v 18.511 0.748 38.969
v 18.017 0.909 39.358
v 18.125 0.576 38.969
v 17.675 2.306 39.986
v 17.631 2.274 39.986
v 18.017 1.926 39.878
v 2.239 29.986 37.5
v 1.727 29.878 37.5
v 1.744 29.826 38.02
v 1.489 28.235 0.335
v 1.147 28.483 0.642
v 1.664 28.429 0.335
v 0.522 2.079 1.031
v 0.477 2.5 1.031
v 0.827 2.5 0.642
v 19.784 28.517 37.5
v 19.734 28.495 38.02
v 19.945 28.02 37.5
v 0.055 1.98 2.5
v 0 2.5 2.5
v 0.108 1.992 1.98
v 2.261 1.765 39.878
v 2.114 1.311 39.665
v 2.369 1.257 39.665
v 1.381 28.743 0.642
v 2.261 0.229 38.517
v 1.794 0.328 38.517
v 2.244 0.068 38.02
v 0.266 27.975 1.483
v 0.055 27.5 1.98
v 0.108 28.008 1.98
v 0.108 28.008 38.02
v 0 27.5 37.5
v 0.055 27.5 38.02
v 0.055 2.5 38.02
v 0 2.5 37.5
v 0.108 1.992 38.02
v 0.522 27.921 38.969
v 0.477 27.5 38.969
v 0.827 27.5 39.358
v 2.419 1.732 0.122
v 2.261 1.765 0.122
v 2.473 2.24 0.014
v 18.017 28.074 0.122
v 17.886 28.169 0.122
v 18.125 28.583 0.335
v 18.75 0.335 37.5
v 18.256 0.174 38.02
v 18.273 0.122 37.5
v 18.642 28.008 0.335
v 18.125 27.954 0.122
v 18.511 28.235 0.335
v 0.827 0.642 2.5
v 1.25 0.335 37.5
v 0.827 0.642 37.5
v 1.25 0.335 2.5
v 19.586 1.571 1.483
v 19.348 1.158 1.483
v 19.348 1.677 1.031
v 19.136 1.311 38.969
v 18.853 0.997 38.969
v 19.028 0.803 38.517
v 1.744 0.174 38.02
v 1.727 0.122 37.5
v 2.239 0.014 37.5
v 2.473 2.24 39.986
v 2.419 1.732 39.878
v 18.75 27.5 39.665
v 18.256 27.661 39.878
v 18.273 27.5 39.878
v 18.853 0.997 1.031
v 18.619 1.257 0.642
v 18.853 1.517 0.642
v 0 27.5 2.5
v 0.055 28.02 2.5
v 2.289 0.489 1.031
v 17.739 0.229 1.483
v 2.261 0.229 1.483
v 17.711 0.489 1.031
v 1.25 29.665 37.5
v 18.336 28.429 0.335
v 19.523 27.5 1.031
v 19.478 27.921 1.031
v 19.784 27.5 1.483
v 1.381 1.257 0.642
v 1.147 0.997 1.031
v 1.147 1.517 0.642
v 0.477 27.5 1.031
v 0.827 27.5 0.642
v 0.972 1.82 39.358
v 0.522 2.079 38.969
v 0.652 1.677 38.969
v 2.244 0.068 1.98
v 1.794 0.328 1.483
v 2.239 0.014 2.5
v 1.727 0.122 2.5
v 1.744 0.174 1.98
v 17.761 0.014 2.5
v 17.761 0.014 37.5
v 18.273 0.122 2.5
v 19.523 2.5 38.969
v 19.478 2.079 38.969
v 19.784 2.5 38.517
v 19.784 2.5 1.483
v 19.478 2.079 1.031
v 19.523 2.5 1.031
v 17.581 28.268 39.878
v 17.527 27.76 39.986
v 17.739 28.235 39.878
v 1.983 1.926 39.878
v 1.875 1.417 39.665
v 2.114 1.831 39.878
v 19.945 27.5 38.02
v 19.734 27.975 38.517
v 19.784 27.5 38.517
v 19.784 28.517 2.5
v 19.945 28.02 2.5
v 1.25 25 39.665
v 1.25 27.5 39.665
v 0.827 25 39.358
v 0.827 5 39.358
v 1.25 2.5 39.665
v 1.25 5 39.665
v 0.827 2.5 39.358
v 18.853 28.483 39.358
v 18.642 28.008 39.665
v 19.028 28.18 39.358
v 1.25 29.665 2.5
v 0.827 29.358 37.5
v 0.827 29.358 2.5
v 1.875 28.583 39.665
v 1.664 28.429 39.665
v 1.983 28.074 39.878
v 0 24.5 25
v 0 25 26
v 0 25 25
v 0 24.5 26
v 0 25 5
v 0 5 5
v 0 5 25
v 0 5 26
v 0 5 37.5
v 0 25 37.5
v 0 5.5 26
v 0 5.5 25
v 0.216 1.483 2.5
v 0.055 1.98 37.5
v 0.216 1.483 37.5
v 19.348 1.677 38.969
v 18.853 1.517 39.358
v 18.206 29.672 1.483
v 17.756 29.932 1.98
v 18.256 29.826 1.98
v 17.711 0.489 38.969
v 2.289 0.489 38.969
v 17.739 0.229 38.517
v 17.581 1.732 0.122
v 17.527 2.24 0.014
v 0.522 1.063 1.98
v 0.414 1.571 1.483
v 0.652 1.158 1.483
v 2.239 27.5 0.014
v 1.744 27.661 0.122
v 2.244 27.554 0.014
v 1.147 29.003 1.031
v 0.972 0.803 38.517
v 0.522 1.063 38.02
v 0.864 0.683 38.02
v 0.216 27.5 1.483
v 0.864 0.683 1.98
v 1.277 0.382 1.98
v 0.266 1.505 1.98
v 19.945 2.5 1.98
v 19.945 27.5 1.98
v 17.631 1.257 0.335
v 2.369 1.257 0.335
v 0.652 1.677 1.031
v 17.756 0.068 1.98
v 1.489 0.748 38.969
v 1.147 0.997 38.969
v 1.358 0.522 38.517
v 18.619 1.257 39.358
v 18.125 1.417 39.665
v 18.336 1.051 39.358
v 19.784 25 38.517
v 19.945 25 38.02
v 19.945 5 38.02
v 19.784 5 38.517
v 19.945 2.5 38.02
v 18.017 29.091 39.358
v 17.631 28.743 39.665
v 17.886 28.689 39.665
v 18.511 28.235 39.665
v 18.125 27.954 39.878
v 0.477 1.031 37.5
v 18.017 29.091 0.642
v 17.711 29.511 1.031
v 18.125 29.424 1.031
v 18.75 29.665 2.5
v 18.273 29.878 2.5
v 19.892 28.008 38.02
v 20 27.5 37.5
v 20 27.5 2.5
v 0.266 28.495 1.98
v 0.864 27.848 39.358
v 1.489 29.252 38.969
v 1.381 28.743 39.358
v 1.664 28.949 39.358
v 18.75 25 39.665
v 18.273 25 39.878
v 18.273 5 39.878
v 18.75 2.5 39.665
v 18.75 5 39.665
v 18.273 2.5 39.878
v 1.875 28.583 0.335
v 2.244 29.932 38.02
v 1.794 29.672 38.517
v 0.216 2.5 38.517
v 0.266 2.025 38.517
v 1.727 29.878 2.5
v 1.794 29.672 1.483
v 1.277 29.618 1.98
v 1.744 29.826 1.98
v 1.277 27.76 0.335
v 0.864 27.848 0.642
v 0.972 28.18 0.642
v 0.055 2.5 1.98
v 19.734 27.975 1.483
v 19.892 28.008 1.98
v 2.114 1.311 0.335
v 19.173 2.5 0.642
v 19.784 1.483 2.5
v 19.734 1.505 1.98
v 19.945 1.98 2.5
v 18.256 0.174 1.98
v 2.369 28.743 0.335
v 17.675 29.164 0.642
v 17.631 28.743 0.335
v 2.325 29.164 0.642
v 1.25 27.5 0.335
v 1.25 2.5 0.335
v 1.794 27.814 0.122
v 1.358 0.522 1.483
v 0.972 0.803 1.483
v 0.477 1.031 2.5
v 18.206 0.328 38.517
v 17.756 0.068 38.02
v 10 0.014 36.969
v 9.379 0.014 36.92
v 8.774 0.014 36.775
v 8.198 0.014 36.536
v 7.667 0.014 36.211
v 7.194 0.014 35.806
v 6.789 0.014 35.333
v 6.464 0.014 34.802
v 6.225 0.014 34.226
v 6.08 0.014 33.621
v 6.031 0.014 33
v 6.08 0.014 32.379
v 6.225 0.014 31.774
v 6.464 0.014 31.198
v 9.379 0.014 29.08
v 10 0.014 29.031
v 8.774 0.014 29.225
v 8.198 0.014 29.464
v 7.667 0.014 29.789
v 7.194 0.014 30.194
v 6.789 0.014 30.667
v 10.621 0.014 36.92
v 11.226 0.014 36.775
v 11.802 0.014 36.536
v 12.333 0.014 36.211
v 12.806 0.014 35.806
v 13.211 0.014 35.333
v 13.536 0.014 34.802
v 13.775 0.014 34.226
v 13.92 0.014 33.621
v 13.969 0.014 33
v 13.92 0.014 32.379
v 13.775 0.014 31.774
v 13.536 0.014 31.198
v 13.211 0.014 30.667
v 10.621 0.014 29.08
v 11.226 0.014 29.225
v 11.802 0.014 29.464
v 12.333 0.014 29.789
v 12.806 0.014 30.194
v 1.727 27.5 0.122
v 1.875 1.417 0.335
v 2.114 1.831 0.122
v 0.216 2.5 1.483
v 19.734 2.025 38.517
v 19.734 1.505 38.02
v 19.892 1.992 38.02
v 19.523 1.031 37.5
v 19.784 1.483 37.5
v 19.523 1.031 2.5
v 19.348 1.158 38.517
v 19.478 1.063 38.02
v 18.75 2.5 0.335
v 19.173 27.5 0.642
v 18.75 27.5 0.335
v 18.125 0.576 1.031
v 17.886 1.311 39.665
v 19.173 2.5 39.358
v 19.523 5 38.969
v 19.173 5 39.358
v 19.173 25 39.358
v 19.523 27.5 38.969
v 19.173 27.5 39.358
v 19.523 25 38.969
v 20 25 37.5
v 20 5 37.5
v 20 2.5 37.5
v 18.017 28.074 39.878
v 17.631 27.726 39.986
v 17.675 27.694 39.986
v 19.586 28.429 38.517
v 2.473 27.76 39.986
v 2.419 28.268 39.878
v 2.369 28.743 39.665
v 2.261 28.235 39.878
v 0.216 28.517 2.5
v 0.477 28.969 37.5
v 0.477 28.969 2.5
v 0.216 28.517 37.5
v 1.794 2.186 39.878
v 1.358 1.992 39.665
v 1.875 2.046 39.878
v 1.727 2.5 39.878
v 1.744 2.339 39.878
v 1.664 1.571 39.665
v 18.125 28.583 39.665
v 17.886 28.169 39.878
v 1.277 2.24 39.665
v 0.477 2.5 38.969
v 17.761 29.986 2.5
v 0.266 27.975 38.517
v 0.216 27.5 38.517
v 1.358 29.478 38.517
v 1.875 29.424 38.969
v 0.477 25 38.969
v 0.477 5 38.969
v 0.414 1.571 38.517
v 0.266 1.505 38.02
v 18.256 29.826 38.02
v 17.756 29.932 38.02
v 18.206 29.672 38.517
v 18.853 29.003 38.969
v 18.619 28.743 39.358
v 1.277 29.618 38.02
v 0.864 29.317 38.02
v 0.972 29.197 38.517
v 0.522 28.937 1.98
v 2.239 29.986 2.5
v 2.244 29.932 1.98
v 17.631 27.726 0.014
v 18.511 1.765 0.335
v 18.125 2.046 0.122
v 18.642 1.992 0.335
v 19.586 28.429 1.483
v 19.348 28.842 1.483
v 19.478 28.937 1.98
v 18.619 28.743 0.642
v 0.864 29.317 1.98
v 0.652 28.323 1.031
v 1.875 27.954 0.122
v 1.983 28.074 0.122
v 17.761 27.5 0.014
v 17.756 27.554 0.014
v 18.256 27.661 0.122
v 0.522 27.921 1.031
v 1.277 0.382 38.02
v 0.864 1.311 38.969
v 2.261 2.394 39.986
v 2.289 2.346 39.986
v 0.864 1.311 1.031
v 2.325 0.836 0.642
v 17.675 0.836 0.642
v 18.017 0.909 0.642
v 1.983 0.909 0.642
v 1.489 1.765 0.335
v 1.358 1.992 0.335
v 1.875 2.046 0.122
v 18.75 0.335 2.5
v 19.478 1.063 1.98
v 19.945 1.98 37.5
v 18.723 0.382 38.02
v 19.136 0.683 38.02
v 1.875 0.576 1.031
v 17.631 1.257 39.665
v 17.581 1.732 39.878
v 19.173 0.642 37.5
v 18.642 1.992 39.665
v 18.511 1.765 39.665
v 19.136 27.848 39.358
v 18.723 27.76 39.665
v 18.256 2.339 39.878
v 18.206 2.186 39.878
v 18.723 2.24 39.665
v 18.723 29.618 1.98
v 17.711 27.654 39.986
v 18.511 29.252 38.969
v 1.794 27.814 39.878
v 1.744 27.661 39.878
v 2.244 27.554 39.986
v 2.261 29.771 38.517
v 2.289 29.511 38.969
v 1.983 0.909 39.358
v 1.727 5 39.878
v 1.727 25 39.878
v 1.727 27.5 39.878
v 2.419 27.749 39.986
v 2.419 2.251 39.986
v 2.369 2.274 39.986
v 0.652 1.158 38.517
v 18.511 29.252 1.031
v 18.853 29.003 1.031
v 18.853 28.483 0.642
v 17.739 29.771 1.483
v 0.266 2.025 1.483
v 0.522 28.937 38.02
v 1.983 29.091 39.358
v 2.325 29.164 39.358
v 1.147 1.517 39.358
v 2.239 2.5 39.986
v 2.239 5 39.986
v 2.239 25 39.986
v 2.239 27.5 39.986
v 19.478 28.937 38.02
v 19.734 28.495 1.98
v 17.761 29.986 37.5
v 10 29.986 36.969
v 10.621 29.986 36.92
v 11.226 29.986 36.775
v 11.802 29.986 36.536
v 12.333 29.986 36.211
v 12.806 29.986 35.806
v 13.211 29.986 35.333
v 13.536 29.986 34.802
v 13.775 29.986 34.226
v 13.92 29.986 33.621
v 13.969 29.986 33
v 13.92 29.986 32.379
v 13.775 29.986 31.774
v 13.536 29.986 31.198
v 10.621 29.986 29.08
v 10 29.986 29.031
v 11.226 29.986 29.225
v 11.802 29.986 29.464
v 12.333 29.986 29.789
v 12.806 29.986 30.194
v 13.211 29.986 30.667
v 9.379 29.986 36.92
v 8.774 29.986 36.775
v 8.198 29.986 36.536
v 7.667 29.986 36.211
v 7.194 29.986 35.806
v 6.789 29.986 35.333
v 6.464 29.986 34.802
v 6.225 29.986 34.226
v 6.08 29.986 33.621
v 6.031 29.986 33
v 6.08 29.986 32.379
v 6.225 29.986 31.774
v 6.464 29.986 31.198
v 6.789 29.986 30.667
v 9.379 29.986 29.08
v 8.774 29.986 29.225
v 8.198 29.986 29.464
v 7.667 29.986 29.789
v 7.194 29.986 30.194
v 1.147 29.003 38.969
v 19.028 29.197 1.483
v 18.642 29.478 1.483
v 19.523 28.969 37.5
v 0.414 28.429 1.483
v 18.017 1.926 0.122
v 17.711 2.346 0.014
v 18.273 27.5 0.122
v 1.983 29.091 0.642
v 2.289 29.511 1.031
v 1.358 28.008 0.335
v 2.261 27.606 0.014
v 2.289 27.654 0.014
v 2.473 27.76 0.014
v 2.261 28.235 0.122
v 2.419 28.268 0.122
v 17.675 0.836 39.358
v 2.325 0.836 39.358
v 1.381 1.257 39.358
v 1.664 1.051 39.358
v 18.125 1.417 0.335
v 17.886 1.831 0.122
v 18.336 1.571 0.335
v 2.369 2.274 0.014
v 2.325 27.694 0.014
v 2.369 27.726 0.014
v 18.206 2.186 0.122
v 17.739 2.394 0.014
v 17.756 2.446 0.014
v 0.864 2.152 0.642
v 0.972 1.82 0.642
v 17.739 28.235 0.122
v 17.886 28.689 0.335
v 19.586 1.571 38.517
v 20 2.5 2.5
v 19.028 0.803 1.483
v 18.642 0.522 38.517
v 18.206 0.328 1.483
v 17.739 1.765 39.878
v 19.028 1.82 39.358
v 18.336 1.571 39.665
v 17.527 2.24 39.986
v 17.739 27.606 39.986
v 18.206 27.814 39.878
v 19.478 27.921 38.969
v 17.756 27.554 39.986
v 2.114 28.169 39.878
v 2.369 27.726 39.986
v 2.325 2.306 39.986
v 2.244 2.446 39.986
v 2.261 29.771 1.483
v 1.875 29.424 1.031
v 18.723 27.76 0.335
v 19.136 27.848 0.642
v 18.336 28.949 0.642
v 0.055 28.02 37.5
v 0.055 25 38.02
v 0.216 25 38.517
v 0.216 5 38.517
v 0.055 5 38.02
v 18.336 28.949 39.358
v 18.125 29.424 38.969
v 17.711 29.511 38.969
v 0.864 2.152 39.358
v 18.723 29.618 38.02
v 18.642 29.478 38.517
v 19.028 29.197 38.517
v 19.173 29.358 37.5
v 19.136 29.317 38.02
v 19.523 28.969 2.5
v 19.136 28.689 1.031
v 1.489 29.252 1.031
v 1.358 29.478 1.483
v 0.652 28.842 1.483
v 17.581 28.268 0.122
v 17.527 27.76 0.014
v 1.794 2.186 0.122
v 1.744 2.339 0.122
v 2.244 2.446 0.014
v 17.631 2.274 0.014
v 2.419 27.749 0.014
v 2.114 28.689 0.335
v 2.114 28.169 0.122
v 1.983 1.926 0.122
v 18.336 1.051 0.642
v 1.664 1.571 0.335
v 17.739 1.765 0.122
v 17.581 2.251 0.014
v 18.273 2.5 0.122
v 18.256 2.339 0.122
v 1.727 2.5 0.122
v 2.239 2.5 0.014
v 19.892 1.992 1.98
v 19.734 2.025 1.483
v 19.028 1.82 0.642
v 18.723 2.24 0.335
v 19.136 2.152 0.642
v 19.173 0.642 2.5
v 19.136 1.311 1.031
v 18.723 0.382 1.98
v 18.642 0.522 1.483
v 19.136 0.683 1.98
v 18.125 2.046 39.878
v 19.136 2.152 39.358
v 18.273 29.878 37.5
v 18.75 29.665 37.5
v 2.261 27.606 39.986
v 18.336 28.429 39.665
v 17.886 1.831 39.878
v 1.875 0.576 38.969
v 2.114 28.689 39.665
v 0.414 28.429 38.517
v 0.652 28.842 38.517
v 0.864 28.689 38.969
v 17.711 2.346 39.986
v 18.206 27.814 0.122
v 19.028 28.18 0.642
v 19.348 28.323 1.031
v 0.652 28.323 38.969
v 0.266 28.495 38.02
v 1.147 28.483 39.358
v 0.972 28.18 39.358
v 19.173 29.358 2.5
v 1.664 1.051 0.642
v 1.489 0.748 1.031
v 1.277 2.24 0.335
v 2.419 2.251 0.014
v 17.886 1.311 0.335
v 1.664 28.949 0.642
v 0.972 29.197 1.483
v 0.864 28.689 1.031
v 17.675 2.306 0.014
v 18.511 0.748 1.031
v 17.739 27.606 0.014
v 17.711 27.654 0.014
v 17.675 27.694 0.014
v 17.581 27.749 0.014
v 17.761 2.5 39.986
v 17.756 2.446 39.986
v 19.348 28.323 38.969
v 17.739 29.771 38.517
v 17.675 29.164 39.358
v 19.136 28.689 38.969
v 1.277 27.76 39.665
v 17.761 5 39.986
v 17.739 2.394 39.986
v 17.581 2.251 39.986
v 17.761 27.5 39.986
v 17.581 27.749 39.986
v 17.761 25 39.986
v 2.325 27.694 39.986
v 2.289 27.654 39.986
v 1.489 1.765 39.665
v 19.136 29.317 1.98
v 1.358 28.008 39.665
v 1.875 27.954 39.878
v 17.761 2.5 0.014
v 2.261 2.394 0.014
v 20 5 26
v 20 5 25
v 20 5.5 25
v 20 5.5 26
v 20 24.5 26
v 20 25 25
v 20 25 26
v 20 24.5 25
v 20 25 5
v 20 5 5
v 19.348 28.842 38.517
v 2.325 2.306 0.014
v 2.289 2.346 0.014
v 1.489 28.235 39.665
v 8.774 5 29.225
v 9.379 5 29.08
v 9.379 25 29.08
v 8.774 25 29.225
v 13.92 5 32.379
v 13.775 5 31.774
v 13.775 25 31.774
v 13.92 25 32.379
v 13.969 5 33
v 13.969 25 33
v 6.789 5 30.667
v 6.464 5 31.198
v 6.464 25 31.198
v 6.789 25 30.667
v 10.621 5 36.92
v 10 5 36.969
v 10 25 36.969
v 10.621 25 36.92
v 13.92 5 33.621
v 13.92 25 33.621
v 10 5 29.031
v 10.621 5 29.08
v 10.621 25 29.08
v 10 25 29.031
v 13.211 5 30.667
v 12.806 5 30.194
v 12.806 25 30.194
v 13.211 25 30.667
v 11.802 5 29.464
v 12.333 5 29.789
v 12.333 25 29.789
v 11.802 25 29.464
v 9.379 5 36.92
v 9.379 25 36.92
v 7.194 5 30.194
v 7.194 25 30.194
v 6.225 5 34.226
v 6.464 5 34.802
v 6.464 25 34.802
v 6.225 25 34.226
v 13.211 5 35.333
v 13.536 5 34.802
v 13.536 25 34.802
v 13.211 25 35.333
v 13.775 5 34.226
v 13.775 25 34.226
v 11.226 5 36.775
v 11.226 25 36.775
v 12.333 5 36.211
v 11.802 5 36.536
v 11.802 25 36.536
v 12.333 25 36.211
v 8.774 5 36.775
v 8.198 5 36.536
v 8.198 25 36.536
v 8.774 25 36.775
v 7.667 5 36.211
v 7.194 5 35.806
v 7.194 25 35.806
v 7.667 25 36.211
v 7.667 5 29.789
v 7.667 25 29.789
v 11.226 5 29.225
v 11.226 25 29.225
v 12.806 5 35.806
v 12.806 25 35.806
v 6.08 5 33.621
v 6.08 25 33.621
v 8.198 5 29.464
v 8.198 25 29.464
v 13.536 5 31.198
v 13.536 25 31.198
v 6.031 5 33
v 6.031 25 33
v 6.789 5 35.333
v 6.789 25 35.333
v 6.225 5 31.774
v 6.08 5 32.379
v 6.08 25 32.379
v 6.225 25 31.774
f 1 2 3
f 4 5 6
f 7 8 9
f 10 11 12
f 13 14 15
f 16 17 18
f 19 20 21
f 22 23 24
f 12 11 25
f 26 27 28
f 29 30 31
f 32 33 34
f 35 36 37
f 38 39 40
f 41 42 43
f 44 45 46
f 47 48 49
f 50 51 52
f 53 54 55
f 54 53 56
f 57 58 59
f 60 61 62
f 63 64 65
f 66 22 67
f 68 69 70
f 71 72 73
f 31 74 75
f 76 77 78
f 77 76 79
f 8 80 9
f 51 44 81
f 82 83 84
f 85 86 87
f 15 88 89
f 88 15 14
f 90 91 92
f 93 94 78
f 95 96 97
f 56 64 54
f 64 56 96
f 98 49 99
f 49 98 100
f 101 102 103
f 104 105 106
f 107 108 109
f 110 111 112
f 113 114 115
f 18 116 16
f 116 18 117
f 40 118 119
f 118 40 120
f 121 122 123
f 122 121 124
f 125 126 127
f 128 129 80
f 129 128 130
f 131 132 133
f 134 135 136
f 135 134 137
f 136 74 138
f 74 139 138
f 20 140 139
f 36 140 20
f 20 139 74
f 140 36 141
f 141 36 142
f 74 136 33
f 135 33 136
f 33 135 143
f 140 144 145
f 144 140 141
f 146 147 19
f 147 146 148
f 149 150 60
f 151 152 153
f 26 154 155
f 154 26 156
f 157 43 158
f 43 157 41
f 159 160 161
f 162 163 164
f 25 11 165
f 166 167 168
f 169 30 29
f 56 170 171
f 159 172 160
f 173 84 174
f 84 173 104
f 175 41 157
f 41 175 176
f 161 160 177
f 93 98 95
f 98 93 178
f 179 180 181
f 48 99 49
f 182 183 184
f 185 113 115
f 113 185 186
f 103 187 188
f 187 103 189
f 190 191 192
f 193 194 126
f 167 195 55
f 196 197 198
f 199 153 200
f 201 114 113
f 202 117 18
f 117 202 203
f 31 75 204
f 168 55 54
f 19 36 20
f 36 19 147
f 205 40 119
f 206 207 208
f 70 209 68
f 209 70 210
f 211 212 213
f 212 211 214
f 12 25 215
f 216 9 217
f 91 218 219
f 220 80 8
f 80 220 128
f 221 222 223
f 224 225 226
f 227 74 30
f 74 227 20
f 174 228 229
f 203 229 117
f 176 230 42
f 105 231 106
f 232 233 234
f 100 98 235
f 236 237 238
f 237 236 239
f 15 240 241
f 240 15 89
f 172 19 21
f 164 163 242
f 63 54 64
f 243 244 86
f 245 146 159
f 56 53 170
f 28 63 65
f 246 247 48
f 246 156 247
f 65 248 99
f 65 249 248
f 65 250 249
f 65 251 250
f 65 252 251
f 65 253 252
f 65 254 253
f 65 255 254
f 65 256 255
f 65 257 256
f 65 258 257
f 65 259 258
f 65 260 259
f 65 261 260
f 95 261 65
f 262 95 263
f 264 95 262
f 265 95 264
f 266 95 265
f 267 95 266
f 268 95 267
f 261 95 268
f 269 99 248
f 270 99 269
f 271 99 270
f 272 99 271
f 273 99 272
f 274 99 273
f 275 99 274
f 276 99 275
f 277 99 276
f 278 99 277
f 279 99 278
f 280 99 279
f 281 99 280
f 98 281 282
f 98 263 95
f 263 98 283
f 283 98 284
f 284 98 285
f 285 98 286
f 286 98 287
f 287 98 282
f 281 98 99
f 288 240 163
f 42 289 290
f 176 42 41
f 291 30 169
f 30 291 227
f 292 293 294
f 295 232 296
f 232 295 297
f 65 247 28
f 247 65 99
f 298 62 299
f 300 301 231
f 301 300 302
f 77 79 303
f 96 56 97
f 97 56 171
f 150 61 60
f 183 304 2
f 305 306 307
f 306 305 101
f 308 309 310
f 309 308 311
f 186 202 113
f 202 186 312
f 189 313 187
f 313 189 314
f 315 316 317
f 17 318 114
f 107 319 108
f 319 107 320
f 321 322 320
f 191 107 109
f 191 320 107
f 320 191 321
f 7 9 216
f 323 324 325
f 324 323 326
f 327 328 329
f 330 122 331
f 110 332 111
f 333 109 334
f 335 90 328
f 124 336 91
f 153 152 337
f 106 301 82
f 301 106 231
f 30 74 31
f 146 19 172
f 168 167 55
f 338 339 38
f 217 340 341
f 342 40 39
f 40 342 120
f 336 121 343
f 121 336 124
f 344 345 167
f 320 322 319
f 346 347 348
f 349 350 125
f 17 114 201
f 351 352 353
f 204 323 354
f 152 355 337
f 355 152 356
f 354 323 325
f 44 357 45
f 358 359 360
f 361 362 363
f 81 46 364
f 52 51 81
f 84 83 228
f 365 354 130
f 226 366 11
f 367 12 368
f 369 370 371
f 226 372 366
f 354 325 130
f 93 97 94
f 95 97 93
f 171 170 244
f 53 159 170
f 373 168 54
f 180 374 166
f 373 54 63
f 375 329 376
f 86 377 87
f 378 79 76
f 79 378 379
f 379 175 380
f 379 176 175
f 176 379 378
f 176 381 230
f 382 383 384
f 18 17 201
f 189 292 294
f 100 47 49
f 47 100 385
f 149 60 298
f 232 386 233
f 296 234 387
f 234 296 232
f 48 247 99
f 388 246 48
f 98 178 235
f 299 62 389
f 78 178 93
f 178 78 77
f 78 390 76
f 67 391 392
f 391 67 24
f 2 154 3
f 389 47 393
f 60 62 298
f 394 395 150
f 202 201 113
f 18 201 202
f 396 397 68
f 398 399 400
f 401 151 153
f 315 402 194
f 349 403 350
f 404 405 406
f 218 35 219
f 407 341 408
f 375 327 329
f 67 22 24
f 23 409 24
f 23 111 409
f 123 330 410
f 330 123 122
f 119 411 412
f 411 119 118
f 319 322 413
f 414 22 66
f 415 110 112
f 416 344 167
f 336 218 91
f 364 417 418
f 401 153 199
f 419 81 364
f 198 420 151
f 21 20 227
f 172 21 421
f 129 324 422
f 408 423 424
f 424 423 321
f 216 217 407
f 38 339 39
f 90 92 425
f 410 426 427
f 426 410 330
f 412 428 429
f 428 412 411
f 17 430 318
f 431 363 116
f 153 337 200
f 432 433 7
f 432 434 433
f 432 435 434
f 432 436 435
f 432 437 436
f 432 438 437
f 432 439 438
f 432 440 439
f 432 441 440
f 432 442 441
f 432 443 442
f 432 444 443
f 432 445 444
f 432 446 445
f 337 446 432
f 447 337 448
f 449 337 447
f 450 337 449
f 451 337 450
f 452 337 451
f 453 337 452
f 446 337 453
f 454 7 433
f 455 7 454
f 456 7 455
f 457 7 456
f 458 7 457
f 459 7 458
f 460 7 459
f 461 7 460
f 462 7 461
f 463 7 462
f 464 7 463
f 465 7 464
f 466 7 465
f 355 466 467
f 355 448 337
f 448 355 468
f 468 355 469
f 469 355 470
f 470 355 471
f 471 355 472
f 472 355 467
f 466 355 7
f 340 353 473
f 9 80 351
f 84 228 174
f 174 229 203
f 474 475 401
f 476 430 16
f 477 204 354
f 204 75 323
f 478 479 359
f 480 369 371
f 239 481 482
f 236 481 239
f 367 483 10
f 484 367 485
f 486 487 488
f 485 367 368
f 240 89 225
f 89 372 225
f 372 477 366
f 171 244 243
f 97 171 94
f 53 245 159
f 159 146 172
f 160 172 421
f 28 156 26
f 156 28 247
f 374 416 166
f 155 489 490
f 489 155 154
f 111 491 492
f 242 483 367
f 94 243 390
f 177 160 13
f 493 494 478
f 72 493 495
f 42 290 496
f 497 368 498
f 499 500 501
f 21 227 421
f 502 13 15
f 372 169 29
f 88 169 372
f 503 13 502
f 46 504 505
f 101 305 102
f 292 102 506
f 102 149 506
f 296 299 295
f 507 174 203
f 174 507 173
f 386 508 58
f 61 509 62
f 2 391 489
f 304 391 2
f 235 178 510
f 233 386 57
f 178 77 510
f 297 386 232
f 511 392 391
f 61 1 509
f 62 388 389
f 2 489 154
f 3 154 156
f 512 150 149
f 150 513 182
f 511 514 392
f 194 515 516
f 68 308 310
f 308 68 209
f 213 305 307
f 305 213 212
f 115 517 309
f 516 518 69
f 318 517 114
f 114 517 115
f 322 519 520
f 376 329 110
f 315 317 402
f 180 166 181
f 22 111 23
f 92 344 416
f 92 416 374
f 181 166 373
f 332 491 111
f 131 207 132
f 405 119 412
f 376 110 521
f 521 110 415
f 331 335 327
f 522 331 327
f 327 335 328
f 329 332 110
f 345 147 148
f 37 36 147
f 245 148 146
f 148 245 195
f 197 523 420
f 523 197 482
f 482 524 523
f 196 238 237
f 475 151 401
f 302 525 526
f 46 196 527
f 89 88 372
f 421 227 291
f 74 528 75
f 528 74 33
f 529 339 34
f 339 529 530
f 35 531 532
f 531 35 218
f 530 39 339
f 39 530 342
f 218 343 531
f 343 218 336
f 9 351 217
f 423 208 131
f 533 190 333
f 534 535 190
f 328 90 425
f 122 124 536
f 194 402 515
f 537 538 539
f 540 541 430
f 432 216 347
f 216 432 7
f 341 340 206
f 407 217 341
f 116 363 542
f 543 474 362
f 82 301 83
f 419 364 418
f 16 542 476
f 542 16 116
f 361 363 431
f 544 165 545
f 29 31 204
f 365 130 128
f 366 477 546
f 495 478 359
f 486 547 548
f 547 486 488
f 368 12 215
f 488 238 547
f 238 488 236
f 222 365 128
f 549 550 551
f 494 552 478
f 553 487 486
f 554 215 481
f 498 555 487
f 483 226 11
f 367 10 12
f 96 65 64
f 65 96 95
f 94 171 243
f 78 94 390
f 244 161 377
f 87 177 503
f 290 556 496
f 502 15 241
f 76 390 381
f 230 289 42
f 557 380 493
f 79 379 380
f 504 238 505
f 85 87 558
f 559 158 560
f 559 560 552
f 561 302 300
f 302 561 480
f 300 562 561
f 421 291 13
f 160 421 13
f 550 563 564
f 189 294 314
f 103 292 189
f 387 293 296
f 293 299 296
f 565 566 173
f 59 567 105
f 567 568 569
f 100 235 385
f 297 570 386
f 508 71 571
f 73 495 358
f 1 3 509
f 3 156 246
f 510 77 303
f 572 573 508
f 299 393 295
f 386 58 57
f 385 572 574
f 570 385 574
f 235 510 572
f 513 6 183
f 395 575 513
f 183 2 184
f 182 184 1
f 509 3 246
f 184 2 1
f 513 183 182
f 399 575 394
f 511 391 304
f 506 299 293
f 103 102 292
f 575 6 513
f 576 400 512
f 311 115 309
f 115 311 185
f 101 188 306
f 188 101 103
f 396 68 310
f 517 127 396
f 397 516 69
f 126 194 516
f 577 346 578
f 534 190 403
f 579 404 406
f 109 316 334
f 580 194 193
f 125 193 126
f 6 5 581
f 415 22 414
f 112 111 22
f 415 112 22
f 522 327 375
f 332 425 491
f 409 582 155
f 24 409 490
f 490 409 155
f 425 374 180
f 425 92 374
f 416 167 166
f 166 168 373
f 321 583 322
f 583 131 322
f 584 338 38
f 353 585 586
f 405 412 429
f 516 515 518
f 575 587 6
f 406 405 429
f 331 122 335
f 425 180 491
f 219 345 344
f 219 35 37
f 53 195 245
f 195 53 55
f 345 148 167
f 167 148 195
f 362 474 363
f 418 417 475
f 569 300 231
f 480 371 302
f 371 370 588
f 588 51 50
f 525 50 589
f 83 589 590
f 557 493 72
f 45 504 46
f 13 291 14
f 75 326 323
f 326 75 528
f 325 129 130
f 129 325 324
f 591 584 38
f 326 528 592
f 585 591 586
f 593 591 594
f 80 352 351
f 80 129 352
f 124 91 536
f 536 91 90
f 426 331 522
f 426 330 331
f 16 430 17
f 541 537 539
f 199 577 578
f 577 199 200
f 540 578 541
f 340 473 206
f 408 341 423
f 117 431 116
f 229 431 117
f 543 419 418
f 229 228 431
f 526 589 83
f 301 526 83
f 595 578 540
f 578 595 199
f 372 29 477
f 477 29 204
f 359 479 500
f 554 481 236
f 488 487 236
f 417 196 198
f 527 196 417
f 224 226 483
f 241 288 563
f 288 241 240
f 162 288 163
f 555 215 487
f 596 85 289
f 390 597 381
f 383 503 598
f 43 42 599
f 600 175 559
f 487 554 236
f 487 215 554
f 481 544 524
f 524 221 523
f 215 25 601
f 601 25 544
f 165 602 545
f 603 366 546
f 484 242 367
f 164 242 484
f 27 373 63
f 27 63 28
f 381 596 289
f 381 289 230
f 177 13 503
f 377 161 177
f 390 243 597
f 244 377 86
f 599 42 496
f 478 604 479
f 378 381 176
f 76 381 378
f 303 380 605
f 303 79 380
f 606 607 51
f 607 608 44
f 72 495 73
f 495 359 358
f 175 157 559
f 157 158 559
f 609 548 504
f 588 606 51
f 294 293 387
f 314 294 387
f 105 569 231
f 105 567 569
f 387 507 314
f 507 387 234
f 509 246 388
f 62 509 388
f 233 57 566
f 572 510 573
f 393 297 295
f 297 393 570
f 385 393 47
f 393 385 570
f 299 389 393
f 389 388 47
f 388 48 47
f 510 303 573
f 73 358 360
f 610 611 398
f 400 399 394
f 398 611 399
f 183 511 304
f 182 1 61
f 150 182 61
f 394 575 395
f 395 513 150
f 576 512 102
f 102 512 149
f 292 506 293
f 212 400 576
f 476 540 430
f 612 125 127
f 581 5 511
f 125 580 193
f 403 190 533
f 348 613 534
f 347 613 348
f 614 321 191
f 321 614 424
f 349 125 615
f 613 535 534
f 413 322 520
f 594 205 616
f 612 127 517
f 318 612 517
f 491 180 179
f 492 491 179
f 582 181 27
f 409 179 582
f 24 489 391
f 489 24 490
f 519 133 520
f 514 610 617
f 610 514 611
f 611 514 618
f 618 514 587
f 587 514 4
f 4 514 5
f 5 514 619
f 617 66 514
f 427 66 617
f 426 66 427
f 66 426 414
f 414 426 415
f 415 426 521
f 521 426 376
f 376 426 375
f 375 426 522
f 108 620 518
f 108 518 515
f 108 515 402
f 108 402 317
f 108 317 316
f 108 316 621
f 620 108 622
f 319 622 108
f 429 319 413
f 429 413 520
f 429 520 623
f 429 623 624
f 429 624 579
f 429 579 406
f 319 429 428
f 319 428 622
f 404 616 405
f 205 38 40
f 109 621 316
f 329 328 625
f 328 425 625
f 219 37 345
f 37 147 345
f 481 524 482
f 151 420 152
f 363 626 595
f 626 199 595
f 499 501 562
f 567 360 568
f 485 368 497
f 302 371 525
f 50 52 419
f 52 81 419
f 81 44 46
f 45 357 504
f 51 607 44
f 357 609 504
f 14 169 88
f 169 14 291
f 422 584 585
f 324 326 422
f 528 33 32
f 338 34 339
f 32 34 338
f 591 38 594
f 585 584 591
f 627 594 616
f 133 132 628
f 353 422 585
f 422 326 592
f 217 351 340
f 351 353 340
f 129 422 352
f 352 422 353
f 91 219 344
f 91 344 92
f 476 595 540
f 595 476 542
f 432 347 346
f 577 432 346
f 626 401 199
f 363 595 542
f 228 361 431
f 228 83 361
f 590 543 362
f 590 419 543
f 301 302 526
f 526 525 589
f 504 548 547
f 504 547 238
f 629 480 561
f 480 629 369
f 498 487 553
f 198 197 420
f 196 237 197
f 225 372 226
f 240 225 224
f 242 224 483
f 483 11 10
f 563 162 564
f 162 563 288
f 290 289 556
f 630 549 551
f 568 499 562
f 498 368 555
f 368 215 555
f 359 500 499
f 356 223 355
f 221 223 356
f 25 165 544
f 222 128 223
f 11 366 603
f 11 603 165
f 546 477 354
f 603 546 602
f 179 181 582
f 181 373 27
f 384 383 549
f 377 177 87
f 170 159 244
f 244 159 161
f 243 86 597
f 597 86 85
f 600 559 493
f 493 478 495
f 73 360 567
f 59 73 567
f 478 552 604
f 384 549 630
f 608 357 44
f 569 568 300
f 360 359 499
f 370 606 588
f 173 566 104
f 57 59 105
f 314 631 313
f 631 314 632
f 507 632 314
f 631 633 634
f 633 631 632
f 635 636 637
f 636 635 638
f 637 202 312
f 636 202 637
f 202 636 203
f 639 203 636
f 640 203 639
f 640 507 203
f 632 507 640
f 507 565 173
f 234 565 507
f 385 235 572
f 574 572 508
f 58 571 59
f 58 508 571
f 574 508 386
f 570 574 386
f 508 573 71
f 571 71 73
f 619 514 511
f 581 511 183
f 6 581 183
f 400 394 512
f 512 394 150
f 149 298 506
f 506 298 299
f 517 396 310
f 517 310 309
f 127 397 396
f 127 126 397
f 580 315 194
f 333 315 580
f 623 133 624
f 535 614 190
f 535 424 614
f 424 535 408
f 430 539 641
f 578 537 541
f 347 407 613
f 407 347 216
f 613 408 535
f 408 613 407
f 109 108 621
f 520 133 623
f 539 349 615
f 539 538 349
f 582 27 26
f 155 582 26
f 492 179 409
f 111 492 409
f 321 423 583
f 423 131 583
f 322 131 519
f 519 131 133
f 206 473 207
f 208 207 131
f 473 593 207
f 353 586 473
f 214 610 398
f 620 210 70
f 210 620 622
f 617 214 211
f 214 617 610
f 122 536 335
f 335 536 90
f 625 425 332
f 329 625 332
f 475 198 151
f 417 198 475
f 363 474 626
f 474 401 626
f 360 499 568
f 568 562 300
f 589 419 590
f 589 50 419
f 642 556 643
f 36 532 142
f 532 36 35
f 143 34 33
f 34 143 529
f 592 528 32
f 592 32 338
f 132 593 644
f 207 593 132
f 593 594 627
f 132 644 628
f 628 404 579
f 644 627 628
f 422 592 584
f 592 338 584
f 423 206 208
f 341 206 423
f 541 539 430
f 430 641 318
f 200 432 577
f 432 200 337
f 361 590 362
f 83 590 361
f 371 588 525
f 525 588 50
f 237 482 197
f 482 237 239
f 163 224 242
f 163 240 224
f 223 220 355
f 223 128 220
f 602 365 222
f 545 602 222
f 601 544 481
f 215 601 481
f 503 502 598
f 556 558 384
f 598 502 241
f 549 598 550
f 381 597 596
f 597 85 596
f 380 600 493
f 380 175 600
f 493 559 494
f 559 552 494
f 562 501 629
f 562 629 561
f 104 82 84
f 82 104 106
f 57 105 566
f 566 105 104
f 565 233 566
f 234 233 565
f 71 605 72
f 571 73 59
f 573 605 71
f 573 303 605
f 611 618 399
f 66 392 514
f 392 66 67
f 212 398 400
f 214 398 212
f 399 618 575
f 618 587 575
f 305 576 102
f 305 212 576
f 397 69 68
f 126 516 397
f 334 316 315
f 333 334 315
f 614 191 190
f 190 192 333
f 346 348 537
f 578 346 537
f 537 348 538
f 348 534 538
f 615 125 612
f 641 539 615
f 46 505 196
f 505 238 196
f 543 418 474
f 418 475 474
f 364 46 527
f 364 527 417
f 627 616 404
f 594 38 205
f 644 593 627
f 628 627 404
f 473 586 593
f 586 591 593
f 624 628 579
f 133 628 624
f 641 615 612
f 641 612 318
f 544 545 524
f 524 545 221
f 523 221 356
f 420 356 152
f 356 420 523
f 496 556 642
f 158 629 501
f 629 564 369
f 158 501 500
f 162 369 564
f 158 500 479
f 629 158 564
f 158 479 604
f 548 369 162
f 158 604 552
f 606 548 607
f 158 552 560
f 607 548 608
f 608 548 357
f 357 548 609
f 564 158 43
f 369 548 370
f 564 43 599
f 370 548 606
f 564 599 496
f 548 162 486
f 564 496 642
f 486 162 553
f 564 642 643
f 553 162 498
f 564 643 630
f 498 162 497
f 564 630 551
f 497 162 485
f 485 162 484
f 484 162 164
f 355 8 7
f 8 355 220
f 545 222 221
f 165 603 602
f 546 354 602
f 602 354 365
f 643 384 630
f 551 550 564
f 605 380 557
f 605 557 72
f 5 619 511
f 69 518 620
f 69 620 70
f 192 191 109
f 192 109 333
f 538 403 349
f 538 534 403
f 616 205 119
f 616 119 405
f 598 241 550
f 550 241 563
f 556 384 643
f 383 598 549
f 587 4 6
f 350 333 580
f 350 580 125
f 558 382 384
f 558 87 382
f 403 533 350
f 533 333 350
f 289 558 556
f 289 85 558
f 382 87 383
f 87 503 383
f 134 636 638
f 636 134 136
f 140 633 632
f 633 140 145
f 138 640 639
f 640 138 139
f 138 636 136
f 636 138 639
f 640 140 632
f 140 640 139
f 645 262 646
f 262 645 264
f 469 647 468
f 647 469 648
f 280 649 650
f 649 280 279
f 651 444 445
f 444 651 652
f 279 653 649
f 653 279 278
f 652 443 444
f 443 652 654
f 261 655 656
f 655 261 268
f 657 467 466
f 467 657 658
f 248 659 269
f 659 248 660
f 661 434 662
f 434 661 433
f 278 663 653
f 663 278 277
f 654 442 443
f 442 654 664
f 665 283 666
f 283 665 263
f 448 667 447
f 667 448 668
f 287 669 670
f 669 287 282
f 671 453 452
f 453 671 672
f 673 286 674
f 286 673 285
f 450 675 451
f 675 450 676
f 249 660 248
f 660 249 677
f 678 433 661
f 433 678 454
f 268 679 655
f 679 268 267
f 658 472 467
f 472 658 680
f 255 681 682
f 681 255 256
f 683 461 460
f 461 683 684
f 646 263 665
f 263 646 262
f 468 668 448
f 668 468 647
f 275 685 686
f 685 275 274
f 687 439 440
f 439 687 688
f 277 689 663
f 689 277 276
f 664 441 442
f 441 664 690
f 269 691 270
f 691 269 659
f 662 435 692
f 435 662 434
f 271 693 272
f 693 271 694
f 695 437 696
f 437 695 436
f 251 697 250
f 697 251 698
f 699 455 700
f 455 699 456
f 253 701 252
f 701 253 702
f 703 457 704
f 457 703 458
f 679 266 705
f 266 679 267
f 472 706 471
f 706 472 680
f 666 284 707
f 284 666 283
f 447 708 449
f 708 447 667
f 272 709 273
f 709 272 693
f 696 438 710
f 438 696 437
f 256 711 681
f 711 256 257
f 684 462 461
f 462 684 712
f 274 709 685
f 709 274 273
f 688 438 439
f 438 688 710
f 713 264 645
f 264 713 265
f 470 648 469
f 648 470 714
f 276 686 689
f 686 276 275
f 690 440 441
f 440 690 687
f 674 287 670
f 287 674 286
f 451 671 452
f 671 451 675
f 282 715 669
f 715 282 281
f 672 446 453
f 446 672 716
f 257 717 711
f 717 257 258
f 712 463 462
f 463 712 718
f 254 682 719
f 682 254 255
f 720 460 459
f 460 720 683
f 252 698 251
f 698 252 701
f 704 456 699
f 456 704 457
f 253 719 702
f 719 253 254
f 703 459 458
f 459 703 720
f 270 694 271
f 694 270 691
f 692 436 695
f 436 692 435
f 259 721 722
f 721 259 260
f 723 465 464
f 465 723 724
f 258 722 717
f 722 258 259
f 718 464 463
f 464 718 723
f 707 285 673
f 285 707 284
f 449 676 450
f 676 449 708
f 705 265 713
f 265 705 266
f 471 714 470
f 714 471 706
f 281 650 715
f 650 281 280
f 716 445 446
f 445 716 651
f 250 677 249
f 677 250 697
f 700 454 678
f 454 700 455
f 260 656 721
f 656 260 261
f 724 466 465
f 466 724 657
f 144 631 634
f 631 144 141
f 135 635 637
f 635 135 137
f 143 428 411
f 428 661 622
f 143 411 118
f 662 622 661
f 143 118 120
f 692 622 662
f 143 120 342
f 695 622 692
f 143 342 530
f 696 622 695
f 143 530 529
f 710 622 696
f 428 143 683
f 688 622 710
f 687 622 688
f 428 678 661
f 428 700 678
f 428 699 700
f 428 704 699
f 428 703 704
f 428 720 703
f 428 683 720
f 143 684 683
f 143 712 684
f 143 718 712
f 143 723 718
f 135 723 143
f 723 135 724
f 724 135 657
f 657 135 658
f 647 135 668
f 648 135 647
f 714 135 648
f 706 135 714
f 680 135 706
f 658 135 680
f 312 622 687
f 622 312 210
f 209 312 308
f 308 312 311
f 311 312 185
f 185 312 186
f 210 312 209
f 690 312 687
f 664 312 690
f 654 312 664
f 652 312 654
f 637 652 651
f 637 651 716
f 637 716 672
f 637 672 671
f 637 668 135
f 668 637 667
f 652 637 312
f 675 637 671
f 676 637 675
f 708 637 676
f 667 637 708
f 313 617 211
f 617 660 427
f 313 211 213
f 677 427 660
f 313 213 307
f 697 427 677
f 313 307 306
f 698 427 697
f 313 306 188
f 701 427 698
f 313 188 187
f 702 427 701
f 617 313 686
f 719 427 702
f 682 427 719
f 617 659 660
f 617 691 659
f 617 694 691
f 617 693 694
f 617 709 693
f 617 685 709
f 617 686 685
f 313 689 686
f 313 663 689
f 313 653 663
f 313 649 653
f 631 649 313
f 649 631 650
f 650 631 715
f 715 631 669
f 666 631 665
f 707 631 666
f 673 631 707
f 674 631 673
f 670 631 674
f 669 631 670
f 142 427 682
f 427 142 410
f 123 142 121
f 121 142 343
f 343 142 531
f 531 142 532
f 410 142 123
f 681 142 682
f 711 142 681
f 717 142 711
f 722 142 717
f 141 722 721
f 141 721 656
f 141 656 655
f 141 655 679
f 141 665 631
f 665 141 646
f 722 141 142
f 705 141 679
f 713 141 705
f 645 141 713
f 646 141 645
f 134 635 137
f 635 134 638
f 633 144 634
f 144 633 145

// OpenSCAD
difference() {
  cube2([20,30,40],2.5);
  translate([-.01,5,5]) cube([31,20,20]);
  translate([10,-.01,33]) rotate([-90,0]) cylinder(d=25.4*(5/16),h=40,$fn=40);
  translate([-.01,5,26]) cube([31,20,20]);
  translate([-.01,5.5,24.99]) cube([31,19,20]);
}


module rsquare(dims,r=5,center=false,$fn=30)
{
  translate(center?[dims[0]/-2,dims[1]/-2]:[0,0])
  hull() for(x=[r,dims[0]-r],y=[r,dims[1]-r]) translate([x,y]) circle(r=r,$fn=$fn);
}
module rcube(dims,r=5,$fn=30)
{
  linear_extrude(dims[2],convexity=3) {
    for(x=[r,dims[0]-r],y=[r,dims[1]-r])
      translate([x,y]) circle(r=r,$fn=$fn);
    translate([0,r]) square([dims[0],dims[1]-r*2]);
    translate([r,0]) square([dims[0]-r*2,dims[1]]);
  }
}
module cube2(dims,r=5,$fn=30)
{
  minkowski() {
    translate([r,r,r]) cube([dims[0]-r*2,dims[1]-r*2,dims[2]-r*2]);
    sphere(r=r,$fn=$fn);
  }
}

function inches(in) = 25.4 * in;
